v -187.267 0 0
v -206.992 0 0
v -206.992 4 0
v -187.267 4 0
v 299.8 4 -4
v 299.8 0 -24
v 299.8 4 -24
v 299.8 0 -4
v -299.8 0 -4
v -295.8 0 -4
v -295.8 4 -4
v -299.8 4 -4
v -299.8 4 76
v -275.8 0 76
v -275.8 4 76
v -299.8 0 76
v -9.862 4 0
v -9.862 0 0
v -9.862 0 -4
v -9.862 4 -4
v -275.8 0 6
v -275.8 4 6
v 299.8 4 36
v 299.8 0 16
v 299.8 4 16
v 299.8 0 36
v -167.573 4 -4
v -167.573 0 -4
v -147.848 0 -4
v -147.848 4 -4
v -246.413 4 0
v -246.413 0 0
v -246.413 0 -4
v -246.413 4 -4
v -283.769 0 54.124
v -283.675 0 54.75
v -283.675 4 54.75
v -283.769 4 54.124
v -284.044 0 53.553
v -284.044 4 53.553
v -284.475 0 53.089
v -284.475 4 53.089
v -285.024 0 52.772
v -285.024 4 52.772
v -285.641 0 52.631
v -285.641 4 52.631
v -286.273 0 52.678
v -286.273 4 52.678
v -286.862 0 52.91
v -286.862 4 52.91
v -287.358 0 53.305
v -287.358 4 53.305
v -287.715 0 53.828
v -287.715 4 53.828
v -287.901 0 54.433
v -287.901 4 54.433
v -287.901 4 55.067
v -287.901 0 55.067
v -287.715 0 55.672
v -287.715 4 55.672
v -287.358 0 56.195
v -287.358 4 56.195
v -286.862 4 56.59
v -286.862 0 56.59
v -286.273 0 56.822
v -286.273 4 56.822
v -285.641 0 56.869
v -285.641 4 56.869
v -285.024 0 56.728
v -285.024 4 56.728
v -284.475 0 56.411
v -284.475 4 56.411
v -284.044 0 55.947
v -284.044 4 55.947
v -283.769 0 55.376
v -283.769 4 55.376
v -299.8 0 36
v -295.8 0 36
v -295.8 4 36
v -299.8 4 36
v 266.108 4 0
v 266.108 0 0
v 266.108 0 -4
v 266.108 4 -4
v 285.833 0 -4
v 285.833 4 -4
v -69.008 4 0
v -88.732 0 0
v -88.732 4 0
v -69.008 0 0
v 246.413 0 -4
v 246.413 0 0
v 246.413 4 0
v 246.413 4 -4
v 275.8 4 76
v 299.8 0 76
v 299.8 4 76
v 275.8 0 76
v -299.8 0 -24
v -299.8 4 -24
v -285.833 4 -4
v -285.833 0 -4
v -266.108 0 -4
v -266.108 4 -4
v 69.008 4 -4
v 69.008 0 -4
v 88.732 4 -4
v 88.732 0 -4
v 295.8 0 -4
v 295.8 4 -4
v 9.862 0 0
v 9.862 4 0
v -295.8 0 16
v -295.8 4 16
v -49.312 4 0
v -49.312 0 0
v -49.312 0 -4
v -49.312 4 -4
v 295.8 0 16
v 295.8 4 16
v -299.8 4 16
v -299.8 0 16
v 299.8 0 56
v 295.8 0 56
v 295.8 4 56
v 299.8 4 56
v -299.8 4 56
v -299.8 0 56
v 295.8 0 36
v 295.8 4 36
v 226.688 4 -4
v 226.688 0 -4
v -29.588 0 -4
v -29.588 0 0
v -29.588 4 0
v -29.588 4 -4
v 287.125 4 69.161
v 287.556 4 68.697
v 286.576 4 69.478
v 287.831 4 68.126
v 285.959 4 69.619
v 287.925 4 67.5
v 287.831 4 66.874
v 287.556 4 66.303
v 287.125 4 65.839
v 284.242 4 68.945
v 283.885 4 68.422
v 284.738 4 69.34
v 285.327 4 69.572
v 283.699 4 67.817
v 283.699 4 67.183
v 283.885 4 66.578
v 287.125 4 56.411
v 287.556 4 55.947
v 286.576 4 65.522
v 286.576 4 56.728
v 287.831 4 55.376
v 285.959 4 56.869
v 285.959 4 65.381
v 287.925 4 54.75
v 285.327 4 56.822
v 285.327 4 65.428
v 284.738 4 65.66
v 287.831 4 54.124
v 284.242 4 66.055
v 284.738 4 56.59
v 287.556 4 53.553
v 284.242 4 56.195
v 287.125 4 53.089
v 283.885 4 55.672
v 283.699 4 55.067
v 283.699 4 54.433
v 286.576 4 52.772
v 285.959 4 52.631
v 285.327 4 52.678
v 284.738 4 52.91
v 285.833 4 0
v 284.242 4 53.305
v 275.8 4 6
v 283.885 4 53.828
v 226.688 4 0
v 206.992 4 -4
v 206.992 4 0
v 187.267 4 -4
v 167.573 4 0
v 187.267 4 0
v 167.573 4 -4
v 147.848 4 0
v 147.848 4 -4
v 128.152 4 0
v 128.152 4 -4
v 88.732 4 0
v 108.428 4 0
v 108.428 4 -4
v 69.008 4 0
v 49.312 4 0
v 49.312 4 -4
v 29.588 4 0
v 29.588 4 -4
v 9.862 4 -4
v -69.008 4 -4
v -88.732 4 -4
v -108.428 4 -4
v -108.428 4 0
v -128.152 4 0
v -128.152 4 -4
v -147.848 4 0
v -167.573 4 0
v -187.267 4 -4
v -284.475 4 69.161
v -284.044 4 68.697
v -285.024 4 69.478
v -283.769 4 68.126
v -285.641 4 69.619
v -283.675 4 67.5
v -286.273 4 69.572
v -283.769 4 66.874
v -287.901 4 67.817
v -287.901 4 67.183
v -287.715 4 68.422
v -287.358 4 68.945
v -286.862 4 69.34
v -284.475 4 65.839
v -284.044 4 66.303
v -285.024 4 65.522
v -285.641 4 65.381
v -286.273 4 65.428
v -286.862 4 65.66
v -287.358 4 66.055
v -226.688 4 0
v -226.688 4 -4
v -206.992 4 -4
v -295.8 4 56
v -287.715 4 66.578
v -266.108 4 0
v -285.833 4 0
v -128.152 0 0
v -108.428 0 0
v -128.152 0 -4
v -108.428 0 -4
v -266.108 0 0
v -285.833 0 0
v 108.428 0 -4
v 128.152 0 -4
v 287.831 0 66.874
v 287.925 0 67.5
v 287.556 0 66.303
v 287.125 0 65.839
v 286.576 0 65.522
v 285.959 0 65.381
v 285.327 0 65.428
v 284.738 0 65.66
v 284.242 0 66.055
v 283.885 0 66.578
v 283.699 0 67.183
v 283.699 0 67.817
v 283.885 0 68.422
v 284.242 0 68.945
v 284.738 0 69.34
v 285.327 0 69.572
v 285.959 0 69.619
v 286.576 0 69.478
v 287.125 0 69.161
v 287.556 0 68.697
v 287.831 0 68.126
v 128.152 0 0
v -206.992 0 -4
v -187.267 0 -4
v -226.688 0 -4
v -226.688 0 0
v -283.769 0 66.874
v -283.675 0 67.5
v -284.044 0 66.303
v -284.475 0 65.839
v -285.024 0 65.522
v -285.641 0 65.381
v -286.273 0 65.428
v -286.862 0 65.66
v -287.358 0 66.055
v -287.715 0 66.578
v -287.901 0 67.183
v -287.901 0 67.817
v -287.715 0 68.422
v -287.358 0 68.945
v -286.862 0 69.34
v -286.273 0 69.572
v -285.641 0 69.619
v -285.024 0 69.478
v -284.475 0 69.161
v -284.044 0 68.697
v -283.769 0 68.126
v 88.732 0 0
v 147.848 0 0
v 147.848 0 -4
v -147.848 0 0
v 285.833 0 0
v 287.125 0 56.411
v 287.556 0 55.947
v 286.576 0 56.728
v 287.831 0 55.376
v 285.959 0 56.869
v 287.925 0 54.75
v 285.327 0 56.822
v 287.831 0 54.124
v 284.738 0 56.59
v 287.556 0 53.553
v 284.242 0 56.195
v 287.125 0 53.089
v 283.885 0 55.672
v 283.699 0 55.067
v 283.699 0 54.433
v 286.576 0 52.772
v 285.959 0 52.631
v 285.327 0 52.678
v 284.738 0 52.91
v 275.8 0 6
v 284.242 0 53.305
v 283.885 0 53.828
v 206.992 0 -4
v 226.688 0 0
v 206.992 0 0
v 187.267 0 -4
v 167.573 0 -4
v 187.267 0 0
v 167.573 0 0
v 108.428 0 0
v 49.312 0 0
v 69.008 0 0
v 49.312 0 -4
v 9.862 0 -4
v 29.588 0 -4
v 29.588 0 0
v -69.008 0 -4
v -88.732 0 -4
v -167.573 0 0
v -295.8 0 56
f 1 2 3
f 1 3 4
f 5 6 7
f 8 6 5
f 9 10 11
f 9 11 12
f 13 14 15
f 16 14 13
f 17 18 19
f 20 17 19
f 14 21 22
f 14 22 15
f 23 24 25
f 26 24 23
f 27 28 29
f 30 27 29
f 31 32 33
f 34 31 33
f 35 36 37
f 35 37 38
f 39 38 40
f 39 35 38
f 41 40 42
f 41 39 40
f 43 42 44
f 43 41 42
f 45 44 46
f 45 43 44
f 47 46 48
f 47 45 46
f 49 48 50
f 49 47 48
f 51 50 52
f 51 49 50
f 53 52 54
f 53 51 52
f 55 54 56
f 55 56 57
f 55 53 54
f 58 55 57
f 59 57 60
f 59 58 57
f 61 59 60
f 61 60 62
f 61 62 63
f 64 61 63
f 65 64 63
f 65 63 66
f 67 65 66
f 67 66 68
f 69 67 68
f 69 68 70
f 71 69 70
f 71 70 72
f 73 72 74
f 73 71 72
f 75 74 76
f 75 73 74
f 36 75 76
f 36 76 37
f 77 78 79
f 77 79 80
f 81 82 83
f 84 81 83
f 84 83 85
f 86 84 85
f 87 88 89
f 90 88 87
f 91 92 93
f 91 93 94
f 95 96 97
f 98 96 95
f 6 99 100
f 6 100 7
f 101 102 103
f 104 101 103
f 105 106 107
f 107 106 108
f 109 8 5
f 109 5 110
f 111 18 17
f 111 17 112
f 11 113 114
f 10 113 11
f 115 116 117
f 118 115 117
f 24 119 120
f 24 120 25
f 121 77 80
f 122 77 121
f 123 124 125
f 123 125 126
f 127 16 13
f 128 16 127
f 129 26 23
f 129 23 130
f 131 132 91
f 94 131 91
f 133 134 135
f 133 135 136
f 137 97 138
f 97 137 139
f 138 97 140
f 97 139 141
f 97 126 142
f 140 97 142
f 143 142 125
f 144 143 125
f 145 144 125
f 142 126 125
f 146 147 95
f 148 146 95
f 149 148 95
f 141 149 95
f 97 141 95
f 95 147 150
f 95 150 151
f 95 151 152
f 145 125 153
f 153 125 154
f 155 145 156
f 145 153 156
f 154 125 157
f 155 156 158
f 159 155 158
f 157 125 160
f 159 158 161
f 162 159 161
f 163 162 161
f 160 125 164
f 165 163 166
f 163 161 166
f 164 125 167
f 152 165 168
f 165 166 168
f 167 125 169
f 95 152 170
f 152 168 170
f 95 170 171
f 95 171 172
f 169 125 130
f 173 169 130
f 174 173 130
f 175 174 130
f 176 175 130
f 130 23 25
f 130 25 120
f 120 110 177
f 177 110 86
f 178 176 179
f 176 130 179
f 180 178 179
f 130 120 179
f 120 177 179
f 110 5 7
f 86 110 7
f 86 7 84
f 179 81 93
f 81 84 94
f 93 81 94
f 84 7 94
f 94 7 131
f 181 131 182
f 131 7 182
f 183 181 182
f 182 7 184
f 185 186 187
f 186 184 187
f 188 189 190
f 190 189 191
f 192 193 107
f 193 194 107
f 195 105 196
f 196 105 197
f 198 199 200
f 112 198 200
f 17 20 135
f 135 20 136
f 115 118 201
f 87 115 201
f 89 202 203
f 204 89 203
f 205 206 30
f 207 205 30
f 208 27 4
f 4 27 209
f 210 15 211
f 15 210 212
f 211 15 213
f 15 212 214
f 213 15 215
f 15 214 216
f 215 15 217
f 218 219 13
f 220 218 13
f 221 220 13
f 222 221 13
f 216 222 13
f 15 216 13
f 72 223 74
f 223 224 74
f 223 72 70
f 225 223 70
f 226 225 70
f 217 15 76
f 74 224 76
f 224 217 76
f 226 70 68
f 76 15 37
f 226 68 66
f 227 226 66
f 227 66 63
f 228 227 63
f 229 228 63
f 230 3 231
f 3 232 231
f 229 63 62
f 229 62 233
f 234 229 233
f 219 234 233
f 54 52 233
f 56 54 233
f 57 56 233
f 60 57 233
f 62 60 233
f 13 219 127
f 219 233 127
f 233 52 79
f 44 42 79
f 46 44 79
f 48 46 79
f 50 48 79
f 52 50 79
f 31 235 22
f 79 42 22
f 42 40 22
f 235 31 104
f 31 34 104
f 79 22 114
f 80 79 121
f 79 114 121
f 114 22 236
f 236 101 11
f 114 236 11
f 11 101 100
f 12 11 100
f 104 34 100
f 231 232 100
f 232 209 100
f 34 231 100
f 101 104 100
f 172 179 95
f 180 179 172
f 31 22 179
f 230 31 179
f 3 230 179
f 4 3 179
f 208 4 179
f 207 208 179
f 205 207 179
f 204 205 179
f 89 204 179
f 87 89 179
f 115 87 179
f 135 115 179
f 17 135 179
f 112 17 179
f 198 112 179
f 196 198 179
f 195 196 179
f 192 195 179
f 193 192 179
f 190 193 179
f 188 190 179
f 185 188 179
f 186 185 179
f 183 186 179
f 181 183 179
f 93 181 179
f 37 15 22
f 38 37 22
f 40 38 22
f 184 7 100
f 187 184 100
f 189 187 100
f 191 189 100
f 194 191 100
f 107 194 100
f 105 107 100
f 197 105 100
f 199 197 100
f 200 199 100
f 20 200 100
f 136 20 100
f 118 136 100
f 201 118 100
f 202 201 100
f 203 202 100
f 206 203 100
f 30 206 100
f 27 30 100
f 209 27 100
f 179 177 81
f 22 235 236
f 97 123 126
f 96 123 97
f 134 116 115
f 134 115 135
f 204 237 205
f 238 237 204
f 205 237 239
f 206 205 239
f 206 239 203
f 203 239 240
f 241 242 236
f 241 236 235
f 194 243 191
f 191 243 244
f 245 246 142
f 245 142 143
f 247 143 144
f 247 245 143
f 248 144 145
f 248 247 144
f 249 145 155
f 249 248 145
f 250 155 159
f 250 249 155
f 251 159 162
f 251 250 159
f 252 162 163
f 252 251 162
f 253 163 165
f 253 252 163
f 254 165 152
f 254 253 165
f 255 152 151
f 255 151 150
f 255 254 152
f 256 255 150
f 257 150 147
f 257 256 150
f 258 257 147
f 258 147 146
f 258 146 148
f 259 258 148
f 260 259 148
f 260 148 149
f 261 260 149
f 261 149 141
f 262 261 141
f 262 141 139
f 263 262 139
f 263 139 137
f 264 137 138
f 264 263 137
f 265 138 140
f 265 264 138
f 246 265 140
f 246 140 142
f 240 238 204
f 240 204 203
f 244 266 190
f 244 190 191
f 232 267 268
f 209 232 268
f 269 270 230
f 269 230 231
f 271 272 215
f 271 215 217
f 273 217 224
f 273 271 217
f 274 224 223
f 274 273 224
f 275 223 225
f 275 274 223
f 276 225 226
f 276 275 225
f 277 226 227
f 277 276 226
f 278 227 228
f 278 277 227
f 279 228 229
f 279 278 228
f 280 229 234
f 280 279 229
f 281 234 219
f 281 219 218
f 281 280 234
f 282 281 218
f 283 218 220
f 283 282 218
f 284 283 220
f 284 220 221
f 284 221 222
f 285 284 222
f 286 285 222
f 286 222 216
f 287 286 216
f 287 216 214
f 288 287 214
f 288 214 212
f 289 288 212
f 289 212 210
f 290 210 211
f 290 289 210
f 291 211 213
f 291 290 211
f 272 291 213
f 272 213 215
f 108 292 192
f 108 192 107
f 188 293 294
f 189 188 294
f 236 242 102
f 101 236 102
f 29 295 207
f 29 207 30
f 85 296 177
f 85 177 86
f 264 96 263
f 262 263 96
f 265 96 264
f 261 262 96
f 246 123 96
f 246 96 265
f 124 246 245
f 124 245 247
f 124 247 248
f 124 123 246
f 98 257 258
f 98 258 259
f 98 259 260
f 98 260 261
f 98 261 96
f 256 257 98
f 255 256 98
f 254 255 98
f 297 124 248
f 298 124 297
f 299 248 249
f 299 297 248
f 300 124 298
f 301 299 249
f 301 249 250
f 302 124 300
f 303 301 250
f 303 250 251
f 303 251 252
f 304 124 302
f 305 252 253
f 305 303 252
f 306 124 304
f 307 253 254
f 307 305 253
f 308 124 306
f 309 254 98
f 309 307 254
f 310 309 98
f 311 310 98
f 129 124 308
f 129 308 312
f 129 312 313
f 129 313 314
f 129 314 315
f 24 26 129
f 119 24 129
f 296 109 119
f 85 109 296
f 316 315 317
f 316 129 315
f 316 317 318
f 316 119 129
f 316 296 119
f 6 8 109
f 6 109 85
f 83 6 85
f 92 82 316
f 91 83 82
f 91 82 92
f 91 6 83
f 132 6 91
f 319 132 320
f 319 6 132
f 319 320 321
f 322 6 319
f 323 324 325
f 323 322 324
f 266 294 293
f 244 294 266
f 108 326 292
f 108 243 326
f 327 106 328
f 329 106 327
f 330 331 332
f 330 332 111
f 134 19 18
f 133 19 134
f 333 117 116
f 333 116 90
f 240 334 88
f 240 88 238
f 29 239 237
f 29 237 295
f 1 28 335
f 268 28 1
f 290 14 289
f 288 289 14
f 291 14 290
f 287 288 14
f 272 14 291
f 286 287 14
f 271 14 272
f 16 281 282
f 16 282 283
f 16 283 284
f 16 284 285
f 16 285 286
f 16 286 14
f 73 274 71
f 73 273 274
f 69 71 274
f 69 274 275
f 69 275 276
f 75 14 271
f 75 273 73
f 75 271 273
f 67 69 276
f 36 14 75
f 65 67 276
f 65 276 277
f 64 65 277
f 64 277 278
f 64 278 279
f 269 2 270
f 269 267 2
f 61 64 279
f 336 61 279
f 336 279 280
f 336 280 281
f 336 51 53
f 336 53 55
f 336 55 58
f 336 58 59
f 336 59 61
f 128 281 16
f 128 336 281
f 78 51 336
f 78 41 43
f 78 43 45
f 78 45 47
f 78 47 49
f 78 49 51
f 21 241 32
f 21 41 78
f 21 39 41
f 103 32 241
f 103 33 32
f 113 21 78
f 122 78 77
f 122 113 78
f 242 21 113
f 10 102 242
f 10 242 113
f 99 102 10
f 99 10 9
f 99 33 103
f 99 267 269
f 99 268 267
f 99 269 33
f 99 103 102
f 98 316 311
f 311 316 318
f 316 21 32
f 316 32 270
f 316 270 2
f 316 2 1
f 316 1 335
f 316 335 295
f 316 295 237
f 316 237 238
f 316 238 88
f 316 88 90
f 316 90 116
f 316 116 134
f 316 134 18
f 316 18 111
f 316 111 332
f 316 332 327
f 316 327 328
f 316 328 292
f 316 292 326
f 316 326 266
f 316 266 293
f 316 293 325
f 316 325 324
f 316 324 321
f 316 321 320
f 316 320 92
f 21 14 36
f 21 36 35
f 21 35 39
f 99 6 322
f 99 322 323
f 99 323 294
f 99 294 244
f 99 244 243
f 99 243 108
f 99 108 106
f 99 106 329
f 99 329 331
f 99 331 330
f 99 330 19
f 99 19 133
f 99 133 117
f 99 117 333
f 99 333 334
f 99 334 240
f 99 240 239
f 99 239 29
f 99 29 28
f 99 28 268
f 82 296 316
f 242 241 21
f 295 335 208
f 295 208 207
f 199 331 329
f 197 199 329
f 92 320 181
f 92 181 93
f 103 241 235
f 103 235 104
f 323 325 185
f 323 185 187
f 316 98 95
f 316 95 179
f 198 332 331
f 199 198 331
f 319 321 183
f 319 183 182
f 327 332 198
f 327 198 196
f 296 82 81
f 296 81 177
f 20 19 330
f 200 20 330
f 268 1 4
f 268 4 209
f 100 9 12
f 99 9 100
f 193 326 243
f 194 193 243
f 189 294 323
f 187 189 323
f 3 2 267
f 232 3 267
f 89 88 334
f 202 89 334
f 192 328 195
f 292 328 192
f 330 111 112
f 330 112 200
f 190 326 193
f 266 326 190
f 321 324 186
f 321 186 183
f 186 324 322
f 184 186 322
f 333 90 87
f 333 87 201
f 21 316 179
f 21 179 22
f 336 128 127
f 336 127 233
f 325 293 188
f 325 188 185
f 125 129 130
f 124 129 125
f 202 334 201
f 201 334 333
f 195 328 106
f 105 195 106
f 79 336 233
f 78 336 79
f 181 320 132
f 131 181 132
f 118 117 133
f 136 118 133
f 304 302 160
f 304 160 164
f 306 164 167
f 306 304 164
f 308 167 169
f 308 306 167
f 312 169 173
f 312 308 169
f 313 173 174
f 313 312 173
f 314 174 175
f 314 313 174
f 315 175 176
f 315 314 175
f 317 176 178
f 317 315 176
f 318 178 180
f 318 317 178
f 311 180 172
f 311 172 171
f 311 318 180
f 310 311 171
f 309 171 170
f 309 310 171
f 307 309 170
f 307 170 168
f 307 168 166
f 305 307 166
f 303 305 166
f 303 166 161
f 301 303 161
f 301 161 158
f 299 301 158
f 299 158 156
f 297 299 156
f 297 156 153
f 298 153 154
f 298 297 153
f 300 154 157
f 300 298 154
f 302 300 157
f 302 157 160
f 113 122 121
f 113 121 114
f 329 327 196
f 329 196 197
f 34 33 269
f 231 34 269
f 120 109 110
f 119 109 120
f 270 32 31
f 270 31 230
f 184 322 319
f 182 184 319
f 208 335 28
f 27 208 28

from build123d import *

# Parameters (mm, degrees)
SKETCH1_R           = 2.125
SKETCH1_W           = 19.725
SKETCH1_H           = 4
BOSS_EXTRUDE1_DEPTH = 4


with BuildPart() as part:
    # Sketch1 → Boss-Extrude1 (new body)
    with BuildSketch(Plane(origin=(0, 0, 0), x_dir=(1, 0, 0), z_dir=(0, 1, 0))):
        Polygon((299.8, 24), (299.8, 4), (295.8, 4), (295.8, -16), (299.8, -16), (299.8, -36), (295.8, -36), (295.8, -56), (299.8, -56), (299.8, -76), (275.8, -76), (275.8, -6), (-275.8, -6), (-275.8, -76), (-299.8, -76), (-299.8, -56), (-295.8, -56), (-295.8, -36), (-299.8, -36), (-299.8, -16), (-295.8, -16), (-295.8, 4), (-299.8, 4), (-299.8, 24), align=None)
        with Locations((285.8, -67.5)):
            Circle(SKETCH1_R, mode=Mode.SUBTRACT)
        with Locations((285.8, -54.75)):
            Circle(SKETCH1_R, mode=Mode.SUBTRACT)
        with Locations((-285.8, -54.75)):
            Circle(SKETCH1_R, mode=Mode.SUBTRACT)
        with Locations((-285.8, -67.5)):
            Circle(SKETCH1_R, mode=Mode.SUBTRACT)
        with Locations((0, 2)):
            Rectangle(SKETCH1_W, SKETCH1_H, mode=Mode.SUBTRACT)
        with Locations((39.45, 2)):
            Rectangle(SKETCH1_W, SKETCH1_H, mode=Mode.SUBTRACT)
        with Locations((78.87, 2)):
            Rectangle(SKETCH1_W, SKETCH1_H, mode=Mode.SUBTRACT)
        with Locations((118.29, 2)):
            Rectangle(SKETCH1_W, SKETCH1_H, mode=Mode.SUBTRACT)
        with Locations((157.71, 2)):
            Rectangle(SKETCH1_W, SKETCH1_H, mode=Mode.SUBTRACT)
        with Locations((197.13, 2)):
            Rectangle(SKETCH1_W, SKETCH1_H, mode=Mode.SUBTRACT)
        with Locations((236.55, 2)):
            Rectangle(SKETCH1_W, SKETCH1_H, mode=Mode.SUBTRACT)
        with Locations((275.97, 2)):
            Rectangle(SKETCH1_W, SKETCH1_H, mode=Mode.SUBTRACT)
        with Locations((-275.97, 2)):
            Rectangle(SKETCH1_W, SKETCH1_H, mode=Mode.SUBTRACT)
        with Locations((-236.55, 2)):
            Rectangle(SKETCH1_W, SKETCH1_H, mode=Mode.SUBTRACT)
        with Locations((-197.13, 2)):
            Rectangle(SKETCH1_W, SKETCH1_H, mode=Mode.SUBTRACT)
        with Locations((-157.71, 2)):
            Rectangle(SKETCH1_W, SKETCH1_H, mode=Mode.SUBTRACT)
        with Locations((-118.29, 2)):
            Rectangle(SKETCH1_W, SKETCH1_H, mode=Mode.SUBTRACT)
        with Locations((-78.87, 2)):
            Rectangle(SKETCH1_W, SKETCH1_H, mode=Mode.SUBTRACT)
        with Locations((-39.45, 2)):
            Rectangle(SKETCH1_W, SKETCH1_H, mode=Mode.SUBTRACT)
    extrude(amount=BOSS_EXTRUDE1_DEPTH)


solid = part.part
